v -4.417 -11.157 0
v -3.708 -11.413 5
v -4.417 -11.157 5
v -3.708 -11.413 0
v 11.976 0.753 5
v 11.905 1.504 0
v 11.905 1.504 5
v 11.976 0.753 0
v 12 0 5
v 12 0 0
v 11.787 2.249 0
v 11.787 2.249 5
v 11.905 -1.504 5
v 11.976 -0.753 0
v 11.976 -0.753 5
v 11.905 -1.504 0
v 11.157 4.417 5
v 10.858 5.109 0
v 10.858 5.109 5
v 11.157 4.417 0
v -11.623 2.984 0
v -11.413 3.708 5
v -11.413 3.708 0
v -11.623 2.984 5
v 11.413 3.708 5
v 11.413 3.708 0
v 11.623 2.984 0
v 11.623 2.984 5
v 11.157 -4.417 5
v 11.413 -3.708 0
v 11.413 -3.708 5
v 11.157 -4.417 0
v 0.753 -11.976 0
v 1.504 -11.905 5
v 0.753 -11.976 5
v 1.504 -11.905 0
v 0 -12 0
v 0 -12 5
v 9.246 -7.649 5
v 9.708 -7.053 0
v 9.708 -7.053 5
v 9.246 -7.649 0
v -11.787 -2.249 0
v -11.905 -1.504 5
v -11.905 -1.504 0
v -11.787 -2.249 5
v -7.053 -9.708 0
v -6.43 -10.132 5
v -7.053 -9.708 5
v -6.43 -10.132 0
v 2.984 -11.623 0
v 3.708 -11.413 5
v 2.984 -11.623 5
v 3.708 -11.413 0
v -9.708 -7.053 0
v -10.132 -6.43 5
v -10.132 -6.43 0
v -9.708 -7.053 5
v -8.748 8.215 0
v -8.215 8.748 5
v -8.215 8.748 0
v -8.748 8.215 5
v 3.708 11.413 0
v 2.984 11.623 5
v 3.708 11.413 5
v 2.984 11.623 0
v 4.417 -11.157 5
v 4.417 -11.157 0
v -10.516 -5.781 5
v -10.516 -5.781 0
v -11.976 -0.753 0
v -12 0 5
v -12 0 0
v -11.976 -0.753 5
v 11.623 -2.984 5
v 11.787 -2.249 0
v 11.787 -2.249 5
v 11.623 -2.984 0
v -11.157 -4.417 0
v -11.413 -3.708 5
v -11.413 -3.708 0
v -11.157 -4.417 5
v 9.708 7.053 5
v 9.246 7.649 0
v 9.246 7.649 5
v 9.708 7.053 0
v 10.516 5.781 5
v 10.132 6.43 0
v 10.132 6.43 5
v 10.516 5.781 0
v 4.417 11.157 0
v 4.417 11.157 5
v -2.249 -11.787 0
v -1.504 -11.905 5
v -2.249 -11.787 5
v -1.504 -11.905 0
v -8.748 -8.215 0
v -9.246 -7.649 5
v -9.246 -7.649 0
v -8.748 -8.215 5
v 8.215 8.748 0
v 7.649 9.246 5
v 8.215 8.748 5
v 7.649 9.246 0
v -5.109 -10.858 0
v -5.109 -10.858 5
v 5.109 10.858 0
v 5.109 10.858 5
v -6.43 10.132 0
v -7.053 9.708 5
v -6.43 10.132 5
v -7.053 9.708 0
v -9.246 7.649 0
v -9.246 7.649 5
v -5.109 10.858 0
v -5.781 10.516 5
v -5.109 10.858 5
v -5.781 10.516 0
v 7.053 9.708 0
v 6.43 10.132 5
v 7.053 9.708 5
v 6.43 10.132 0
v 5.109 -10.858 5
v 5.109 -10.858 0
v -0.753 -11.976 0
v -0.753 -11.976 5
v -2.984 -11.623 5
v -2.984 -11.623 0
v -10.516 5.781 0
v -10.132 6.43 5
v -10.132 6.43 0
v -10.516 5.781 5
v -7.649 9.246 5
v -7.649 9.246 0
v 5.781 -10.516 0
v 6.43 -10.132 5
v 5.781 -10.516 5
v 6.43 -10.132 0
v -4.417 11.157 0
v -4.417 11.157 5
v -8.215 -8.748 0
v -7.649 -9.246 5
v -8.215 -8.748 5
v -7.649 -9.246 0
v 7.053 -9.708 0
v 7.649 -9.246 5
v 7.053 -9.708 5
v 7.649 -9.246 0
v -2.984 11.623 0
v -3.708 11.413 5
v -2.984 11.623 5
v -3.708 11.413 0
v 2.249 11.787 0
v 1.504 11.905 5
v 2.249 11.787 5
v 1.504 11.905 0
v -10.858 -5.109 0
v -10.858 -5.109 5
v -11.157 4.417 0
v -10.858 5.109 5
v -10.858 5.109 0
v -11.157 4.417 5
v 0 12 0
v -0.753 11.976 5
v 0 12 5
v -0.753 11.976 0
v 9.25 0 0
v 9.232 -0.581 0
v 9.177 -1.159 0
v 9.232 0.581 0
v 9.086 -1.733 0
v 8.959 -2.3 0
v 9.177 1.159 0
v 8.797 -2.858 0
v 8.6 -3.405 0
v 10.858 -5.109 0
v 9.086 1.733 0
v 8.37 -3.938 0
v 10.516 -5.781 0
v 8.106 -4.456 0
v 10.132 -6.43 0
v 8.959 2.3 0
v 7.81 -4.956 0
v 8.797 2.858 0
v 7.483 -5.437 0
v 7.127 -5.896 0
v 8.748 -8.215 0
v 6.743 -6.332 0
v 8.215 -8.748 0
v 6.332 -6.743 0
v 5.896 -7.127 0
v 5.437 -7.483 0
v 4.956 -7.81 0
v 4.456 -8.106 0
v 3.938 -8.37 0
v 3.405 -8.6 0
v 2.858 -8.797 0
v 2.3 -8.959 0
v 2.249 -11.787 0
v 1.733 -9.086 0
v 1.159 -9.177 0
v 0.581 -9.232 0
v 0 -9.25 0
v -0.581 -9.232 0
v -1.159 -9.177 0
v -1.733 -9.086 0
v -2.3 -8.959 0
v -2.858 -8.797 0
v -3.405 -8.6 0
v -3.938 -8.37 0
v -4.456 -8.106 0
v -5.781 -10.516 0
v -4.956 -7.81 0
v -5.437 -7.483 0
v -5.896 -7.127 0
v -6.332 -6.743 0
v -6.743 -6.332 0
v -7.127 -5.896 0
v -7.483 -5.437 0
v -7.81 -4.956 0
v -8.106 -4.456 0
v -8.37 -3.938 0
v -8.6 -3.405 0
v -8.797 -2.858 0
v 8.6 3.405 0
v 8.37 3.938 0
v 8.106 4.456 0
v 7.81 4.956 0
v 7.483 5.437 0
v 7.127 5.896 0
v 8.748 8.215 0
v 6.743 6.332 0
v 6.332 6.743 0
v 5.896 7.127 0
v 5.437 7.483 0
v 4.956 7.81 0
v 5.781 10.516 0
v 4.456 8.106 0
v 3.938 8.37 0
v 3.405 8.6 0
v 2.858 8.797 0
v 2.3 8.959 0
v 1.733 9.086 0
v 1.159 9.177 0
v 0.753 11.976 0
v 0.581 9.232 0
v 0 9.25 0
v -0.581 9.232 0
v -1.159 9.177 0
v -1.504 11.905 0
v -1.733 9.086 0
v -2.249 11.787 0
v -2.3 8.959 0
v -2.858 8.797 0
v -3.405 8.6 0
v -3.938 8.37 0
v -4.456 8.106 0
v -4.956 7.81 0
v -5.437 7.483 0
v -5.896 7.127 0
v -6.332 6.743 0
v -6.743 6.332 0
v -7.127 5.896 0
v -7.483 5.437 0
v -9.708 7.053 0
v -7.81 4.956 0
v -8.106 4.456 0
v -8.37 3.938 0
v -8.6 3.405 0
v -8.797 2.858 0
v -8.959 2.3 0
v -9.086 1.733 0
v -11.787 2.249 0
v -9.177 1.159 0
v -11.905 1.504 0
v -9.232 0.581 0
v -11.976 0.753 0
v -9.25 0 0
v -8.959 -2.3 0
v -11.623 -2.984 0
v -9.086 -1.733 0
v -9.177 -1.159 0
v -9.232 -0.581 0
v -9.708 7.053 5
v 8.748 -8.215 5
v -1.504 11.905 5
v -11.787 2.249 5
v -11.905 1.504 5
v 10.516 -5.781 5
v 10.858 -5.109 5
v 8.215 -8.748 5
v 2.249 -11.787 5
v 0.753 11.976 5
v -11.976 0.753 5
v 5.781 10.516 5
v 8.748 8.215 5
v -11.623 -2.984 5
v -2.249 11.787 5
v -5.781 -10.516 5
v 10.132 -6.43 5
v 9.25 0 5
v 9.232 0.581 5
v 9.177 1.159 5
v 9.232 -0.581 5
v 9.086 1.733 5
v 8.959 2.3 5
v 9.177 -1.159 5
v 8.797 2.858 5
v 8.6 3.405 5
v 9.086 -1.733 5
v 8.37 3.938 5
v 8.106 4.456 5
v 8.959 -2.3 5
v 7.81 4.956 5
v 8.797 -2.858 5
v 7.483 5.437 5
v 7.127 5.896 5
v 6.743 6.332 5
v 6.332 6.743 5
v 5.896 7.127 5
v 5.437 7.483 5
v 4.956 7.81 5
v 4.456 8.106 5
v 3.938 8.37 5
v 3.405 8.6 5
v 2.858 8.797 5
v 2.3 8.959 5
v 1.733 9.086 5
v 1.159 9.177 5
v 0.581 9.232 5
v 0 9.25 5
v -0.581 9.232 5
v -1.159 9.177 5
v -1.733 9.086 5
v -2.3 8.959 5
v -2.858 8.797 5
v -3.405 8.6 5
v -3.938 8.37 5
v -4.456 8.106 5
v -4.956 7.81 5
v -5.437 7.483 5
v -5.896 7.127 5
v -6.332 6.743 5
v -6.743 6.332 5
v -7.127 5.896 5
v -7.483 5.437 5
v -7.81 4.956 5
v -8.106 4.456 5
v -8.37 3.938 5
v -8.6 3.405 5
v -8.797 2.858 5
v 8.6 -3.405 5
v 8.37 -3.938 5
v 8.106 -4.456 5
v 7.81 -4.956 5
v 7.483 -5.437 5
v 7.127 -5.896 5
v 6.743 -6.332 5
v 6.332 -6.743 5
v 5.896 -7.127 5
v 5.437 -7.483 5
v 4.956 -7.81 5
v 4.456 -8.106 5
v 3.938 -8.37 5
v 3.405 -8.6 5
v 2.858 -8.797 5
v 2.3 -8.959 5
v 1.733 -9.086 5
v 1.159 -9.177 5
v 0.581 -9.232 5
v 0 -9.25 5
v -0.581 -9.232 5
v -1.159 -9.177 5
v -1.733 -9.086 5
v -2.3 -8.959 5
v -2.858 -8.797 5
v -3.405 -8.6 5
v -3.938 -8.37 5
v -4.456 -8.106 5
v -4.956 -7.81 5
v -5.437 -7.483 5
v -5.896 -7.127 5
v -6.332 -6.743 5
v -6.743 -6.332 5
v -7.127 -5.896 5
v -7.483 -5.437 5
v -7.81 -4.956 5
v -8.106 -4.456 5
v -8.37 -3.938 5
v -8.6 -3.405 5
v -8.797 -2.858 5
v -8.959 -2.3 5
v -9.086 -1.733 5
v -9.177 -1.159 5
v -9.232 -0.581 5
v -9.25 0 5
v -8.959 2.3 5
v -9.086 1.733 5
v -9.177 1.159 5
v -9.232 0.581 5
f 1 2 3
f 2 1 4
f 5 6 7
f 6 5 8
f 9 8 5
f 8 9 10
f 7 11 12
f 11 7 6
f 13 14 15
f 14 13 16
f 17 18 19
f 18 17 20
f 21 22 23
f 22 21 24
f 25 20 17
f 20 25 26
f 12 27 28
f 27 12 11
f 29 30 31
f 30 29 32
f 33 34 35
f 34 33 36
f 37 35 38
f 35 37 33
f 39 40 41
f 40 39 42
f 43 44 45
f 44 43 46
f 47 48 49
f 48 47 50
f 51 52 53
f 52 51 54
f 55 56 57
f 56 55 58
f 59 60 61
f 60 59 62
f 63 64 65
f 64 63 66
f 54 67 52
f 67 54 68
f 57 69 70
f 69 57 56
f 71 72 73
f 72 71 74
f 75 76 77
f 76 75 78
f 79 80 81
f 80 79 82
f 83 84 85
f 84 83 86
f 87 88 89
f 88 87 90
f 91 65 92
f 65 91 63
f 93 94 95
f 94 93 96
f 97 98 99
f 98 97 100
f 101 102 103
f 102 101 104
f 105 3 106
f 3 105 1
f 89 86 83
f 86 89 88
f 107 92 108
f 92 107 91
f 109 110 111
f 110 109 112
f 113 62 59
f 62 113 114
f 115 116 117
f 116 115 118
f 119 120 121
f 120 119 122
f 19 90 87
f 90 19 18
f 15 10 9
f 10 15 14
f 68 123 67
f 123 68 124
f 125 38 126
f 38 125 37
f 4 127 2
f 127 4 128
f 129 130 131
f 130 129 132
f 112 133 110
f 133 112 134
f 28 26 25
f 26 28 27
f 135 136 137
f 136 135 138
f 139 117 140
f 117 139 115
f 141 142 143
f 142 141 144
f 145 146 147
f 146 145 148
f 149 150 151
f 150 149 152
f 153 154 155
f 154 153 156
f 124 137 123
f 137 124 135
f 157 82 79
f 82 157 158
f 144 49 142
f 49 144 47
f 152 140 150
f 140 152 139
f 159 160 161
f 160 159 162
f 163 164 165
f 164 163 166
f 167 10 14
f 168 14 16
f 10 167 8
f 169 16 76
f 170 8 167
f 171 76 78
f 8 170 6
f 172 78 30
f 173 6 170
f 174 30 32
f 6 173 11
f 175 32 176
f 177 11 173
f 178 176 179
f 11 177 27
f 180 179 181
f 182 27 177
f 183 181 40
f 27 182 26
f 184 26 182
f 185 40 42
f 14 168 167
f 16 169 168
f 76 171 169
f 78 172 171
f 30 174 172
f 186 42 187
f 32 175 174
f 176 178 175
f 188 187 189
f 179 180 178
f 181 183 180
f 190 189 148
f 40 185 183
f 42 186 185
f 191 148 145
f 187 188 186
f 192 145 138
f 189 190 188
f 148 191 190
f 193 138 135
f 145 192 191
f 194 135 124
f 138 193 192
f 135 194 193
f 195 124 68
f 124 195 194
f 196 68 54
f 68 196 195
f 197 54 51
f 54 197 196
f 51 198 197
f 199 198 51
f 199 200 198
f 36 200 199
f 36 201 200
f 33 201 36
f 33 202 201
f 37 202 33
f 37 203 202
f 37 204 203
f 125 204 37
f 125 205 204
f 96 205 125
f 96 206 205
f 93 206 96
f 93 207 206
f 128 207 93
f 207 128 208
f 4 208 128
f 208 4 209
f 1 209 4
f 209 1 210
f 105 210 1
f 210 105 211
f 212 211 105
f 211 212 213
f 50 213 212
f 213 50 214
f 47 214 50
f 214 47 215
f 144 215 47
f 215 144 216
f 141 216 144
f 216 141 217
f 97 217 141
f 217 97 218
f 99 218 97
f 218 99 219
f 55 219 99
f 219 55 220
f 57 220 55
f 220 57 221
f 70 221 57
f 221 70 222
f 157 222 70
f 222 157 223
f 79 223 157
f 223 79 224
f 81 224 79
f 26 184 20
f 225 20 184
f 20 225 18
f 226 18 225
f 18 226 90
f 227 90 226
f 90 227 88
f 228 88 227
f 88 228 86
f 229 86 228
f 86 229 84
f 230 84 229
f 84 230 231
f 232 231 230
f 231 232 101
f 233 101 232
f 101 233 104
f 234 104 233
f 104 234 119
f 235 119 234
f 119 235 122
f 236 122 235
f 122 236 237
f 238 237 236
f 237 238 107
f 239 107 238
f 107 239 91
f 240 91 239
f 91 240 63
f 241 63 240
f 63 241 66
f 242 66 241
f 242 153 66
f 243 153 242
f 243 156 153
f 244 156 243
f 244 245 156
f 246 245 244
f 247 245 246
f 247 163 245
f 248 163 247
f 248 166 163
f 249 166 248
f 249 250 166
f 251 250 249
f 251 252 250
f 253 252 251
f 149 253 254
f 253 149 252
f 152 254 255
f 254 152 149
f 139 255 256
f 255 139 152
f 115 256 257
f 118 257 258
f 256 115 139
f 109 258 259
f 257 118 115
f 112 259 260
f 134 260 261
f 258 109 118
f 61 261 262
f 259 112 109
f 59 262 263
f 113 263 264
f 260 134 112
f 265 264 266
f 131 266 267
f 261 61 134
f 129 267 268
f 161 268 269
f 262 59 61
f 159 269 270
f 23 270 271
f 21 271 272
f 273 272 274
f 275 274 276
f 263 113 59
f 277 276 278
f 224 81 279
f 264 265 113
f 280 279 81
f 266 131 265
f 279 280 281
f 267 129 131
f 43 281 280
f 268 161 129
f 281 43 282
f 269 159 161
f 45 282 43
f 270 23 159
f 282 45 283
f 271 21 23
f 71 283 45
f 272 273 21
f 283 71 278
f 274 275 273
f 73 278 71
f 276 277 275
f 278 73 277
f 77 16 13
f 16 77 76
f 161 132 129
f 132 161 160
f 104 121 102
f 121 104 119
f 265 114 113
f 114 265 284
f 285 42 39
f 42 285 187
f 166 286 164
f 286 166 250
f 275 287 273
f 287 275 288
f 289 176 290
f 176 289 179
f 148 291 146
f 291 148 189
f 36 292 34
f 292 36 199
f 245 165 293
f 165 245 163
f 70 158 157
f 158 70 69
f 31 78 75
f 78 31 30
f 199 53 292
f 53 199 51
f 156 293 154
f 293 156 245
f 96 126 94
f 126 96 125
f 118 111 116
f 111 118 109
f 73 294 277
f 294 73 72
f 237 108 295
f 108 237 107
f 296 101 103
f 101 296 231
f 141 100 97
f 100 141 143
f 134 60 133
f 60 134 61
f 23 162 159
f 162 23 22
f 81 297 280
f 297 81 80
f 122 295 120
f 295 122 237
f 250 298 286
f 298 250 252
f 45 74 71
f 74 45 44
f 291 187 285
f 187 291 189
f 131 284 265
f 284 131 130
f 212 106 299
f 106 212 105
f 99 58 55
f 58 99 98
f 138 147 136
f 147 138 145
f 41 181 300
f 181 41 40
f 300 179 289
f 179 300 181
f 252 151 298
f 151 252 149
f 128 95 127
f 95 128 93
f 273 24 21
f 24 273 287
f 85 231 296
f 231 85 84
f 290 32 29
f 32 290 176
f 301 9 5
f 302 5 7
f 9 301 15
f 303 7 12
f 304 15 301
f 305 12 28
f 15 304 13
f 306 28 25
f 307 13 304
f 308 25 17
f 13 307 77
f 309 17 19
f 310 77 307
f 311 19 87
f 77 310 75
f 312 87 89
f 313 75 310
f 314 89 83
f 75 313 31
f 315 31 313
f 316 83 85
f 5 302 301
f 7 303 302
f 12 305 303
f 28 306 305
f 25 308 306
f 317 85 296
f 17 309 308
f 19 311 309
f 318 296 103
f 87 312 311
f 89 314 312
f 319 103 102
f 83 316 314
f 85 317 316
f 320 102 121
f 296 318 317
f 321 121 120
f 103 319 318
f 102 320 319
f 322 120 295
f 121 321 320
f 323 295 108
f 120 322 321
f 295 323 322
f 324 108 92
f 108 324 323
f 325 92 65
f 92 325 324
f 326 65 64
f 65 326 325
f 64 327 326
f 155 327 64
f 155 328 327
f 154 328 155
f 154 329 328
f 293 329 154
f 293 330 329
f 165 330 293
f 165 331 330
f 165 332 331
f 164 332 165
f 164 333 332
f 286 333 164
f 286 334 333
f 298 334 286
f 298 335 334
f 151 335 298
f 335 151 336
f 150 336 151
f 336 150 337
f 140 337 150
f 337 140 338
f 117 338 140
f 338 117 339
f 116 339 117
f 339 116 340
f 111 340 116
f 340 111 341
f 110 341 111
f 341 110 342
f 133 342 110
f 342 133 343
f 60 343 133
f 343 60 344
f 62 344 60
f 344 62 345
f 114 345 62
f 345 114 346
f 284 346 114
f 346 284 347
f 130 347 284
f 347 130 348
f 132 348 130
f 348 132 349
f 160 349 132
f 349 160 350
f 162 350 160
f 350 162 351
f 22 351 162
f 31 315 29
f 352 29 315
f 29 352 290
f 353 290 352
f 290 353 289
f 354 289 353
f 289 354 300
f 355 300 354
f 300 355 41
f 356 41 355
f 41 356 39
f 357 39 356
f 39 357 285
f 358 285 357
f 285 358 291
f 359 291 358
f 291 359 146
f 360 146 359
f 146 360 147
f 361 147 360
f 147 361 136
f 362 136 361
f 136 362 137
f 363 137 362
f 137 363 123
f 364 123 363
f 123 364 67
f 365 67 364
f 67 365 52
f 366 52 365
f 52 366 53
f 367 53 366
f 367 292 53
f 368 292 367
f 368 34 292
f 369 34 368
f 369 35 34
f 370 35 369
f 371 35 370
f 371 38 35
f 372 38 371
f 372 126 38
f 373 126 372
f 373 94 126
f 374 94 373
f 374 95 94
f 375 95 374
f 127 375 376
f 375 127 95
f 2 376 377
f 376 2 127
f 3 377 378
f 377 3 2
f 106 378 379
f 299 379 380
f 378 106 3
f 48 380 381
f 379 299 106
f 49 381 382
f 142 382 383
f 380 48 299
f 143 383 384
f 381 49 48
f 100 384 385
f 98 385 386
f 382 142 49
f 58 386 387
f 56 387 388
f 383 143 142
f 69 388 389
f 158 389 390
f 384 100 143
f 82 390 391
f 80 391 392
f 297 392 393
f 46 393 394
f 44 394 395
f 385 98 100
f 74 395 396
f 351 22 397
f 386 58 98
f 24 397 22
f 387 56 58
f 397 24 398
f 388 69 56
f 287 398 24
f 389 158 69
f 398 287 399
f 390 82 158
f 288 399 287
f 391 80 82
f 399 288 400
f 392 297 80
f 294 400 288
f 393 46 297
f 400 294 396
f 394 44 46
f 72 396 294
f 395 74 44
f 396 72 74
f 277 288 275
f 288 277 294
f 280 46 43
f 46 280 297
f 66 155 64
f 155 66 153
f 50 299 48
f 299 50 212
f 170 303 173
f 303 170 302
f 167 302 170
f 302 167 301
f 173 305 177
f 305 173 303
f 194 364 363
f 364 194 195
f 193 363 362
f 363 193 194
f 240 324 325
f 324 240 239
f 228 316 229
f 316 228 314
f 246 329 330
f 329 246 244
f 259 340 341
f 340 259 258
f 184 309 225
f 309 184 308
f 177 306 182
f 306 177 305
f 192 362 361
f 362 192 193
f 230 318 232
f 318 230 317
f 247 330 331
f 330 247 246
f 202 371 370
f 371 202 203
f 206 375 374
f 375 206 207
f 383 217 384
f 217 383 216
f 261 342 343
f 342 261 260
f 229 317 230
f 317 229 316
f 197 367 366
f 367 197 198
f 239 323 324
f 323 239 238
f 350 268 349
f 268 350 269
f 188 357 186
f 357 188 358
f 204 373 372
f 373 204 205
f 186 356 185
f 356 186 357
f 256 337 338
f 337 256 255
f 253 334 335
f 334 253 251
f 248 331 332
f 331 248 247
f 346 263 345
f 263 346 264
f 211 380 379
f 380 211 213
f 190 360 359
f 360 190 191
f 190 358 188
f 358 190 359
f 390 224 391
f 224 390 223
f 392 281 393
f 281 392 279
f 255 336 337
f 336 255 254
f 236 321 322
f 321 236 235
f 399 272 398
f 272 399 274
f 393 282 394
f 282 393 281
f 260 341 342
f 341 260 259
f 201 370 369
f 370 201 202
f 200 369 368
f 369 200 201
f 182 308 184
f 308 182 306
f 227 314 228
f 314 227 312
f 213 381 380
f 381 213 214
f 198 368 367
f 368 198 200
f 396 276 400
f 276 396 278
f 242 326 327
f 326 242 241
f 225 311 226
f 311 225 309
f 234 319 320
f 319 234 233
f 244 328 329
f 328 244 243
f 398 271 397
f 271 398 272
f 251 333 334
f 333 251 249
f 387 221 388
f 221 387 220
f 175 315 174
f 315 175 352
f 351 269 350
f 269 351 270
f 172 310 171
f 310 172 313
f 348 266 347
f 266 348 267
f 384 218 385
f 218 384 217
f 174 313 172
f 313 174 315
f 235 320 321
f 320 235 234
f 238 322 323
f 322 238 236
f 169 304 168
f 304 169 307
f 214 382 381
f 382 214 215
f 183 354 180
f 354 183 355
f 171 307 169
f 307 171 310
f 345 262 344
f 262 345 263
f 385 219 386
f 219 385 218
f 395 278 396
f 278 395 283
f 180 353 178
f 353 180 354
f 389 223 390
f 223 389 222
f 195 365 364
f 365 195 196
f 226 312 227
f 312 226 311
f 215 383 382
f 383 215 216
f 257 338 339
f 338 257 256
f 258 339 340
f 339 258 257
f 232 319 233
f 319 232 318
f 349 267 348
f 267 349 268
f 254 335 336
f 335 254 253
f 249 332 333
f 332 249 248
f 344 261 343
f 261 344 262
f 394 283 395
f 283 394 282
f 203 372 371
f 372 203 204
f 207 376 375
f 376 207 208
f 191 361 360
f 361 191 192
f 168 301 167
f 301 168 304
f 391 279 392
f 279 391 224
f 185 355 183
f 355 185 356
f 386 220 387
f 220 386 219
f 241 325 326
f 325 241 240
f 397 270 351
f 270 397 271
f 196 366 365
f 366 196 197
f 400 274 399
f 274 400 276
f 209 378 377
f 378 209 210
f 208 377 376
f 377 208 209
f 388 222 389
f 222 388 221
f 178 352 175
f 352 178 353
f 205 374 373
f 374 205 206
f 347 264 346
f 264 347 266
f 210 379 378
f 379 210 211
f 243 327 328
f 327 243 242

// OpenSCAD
$fn=100;

difference(){
    cylinder(5,12,12);
    translate([0,0,-1])
    cylinder(12,9.25,9.25);
}
/*
translate([0,0,5])
difference(){
    cylinder(5,12,12);
    translate([0,0,-1])
    cylinder(12,10,10);
}
*/
